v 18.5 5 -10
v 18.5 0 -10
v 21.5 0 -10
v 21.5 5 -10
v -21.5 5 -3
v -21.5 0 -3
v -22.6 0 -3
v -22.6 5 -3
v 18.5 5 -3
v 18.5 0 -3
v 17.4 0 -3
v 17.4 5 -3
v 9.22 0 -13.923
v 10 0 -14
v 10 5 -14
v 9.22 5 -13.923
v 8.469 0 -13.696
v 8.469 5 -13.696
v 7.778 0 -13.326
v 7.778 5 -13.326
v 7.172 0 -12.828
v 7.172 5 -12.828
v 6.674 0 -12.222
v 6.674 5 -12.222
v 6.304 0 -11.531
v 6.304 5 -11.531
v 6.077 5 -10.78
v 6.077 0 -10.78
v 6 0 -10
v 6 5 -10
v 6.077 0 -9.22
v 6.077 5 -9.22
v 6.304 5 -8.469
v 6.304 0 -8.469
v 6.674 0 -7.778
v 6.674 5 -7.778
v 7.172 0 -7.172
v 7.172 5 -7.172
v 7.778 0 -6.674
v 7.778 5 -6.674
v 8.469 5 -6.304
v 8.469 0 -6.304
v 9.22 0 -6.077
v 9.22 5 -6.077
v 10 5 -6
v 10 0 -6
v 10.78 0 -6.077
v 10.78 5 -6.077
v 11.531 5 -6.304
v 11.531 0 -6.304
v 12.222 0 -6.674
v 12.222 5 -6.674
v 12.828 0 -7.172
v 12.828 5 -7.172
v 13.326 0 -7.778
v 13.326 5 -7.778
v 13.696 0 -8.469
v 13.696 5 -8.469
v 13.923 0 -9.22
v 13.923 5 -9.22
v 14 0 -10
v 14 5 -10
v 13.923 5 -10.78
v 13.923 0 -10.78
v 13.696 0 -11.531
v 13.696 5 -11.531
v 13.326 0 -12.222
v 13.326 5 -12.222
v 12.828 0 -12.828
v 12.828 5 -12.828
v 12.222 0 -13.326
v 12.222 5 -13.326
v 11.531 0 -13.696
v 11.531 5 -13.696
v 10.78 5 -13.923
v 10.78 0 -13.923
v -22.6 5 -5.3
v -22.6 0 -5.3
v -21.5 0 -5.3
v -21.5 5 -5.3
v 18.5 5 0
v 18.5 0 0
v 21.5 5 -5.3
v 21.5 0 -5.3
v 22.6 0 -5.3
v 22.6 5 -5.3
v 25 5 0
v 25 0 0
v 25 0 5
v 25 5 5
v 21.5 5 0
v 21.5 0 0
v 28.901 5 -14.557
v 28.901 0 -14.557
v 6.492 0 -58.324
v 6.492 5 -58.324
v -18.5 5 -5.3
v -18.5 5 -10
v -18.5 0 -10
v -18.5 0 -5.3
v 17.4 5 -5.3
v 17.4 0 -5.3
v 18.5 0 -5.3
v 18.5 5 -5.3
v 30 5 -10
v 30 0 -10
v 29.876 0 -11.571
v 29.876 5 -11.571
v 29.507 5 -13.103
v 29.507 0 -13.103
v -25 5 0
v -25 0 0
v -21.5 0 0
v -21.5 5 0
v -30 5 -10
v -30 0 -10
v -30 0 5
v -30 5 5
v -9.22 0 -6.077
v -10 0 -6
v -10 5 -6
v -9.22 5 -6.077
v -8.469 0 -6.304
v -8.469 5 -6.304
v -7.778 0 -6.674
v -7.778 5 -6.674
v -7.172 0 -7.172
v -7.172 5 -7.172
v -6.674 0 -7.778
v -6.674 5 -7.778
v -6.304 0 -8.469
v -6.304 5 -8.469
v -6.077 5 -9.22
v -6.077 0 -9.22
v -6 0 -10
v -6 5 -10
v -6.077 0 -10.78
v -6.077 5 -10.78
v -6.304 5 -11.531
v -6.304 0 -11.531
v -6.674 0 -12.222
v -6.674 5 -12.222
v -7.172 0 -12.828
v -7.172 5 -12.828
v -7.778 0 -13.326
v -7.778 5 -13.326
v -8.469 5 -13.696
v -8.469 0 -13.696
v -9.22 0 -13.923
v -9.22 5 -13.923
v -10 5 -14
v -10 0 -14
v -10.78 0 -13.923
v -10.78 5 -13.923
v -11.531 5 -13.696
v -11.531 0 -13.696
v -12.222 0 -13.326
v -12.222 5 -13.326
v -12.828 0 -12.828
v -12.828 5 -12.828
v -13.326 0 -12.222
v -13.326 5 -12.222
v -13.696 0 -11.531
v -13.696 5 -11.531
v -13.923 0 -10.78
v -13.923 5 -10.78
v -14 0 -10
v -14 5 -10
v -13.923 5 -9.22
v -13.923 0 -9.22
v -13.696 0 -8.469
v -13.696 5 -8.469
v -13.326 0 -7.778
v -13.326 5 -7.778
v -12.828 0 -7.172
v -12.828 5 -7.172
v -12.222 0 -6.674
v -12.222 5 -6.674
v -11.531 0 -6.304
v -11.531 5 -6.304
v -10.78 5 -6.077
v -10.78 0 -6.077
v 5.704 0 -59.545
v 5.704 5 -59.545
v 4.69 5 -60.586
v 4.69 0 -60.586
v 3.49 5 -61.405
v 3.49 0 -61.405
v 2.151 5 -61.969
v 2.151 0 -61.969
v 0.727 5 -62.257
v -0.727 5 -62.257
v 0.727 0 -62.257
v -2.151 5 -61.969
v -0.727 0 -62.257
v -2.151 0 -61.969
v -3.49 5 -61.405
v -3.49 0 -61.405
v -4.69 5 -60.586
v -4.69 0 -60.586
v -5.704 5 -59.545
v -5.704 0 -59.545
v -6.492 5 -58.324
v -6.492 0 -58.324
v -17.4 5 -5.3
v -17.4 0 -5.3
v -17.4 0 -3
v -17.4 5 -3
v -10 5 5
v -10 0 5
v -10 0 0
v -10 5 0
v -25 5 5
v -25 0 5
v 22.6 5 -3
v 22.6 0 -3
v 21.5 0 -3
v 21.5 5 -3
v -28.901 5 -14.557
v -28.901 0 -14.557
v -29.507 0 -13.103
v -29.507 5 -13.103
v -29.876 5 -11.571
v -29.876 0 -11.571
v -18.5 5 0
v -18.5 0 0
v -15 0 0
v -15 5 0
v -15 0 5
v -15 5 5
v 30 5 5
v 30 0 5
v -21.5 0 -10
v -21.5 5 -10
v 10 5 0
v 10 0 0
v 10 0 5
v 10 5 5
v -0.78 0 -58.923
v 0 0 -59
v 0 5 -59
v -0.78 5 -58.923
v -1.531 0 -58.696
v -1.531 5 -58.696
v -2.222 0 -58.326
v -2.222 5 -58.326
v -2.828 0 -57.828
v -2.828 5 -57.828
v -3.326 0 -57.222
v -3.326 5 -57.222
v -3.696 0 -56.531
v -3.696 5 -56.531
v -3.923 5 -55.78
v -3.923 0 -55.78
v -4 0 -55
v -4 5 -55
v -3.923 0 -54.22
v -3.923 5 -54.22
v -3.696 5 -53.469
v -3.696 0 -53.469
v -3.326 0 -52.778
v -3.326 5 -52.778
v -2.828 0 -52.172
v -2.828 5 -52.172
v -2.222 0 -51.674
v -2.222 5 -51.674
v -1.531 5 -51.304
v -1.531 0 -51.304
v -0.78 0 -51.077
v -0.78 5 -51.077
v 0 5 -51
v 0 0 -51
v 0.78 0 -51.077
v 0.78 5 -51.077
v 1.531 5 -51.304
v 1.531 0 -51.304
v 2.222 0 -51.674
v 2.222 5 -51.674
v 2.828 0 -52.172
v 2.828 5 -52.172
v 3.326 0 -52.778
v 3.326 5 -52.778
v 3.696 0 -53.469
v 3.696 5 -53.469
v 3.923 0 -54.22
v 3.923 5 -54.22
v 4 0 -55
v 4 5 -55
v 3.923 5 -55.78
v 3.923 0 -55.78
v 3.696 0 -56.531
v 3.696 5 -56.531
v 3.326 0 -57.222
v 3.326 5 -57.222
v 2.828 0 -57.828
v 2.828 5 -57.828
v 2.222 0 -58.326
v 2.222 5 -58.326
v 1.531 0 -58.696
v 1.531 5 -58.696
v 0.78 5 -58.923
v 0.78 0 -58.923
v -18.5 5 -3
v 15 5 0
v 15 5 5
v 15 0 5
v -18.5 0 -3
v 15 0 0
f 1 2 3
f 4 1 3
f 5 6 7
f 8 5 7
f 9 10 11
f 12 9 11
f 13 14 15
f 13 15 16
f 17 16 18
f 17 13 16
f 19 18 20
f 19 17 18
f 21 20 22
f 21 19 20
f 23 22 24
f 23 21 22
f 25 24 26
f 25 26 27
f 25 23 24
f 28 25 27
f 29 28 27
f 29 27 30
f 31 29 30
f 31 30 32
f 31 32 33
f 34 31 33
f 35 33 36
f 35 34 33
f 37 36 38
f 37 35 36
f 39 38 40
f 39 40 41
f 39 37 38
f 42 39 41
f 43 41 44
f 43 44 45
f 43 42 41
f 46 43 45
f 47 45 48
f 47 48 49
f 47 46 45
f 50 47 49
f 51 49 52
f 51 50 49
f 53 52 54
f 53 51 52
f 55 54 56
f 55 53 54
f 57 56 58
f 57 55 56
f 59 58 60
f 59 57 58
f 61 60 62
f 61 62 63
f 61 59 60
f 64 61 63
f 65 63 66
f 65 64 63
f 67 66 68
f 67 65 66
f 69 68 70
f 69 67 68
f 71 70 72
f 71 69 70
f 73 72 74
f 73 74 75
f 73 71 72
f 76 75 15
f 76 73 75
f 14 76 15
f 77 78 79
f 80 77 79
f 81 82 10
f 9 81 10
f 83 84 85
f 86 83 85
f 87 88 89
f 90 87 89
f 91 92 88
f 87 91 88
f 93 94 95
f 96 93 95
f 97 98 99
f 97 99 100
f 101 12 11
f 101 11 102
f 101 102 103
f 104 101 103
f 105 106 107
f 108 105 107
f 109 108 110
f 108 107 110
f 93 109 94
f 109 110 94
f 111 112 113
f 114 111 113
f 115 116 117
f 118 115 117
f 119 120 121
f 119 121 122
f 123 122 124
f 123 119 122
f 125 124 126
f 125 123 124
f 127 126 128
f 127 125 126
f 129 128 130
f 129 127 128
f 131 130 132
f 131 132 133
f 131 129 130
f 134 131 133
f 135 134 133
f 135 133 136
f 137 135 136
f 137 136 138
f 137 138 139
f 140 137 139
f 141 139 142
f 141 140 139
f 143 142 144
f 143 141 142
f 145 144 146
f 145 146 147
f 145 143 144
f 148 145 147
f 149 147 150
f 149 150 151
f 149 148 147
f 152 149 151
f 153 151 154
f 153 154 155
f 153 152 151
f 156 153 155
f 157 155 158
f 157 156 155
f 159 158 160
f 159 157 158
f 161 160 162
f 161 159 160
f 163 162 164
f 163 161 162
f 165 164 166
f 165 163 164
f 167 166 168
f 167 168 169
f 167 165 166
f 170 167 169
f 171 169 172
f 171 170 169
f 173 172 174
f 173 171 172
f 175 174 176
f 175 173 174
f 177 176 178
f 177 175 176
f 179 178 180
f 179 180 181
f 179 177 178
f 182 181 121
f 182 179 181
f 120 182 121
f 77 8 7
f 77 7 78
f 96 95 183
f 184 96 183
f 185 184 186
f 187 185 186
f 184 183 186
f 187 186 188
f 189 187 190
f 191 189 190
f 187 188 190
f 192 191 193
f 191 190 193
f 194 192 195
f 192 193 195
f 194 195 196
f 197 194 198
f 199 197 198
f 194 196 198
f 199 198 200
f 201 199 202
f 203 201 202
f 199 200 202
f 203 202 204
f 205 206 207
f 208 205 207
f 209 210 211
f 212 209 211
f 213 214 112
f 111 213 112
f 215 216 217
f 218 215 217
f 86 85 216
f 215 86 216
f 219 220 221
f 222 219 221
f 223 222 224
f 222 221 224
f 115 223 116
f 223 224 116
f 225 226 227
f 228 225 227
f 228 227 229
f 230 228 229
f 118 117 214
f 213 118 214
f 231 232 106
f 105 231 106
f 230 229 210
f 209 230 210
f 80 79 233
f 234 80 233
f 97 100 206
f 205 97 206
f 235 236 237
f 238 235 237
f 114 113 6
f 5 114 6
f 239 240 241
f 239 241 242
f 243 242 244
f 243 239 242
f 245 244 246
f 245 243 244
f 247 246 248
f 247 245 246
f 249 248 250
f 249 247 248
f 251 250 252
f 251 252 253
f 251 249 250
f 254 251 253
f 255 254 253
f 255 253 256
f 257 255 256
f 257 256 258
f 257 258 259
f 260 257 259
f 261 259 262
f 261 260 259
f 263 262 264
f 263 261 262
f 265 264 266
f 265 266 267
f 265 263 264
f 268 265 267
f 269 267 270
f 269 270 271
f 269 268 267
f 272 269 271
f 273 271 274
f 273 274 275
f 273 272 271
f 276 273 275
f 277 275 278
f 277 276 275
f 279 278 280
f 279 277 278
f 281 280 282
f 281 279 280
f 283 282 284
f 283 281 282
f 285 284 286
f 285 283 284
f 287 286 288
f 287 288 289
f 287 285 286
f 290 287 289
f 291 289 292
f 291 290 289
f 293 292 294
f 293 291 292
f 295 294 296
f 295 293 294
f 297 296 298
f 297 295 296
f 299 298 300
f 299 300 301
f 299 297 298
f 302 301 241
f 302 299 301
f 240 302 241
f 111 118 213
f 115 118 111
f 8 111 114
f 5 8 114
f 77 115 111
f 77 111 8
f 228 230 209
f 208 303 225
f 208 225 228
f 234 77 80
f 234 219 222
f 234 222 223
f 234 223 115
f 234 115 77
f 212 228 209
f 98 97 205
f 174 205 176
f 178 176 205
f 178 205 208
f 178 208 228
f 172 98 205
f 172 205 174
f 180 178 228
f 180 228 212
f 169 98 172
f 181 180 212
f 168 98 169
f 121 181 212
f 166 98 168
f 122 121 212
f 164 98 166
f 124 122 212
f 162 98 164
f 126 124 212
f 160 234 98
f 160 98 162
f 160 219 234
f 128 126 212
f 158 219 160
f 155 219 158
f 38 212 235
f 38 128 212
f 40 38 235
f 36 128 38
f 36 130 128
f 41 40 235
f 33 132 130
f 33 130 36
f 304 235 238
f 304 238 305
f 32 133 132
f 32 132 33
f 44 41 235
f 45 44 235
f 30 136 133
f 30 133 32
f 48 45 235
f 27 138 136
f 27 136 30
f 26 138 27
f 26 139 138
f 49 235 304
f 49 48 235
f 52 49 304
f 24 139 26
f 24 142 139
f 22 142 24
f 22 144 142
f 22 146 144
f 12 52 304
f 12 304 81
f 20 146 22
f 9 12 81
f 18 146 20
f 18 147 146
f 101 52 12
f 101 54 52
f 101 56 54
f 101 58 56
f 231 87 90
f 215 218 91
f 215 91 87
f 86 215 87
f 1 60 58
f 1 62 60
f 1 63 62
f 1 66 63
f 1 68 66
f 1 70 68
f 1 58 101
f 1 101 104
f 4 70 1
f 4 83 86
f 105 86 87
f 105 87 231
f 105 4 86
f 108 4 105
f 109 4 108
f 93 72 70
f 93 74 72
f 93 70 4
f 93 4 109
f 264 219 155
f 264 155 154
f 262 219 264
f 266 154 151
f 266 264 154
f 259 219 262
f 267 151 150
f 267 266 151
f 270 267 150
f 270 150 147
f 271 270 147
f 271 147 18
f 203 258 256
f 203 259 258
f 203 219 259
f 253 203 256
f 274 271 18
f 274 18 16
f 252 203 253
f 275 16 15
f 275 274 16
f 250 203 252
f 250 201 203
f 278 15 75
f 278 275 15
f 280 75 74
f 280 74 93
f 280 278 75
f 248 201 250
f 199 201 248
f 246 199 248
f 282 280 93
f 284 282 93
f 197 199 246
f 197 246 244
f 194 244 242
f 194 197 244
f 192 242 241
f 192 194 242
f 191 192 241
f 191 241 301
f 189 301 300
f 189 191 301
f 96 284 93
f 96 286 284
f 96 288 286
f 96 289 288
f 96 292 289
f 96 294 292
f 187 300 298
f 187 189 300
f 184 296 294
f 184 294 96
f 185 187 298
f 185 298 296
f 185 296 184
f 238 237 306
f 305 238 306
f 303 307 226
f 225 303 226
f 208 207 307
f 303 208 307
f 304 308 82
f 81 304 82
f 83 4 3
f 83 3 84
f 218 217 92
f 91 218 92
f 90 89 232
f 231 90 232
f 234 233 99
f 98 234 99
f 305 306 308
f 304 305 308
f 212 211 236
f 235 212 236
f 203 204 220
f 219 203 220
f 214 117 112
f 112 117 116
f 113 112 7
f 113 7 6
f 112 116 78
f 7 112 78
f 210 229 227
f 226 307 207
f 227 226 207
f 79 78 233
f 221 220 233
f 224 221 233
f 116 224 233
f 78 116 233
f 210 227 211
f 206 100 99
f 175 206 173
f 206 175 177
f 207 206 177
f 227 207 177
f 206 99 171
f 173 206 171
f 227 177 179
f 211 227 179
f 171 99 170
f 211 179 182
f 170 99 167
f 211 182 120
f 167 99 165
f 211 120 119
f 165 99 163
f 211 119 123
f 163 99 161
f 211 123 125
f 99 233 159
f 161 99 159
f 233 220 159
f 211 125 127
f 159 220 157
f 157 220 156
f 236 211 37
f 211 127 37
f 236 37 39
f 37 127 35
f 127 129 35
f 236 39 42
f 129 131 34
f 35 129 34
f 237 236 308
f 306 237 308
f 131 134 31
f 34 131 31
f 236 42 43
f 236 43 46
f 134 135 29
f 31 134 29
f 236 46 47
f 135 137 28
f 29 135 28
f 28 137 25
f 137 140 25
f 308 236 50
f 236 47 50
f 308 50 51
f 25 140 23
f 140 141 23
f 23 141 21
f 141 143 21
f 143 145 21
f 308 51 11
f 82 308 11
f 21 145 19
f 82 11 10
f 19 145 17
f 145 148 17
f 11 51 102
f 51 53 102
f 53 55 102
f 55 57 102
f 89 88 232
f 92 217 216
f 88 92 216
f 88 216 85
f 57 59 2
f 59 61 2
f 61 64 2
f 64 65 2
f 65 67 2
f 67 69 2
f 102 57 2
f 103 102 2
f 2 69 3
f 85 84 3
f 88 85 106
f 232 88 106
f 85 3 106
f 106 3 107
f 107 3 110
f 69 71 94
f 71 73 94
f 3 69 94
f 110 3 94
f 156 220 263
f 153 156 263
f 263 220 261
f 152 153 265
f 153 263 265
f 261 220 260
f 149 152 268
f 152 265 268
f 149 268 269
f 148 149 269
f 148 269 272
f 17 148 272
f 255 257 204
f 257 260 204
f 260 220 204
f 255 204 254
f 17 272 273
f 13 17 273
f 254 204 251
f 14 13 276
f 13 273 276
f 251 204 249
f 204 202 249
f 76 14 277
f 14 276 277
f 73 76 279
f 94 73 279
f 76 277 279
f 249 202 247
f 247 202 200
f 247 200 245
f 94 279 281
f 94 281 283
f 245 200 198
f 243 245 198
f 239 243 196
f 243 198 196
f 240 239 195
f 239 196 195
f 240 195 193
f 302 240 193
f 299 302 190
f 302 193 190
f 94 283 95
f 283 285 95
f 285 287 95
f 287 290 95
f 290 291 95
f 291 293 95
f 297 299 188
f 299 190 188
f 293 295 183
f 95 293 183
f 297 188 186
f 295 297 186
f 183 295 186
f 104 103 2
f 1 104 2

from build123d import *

# Parameters (mm, degrees)
SKETCH1_R           = 4
BOSS_EXTRUDE1_DEPTH = 5


with BuildPart() as part:
    # Sketch1 → Boss-Extrude1 (new body)
    with BuildSketch(Plane(origin=(0, 0, 0), x_dir=(1, 0, 0), z_dir=(0, 1, 0))):
        with BuildLine():
            Line((-30, 10), (-30, -5))
            Line((-30, -5), (-25, -5))
            Line((-25, -5), (-25, 0))
            Line((-25, 0), (-21.5, 0))
            Line((-21.5, 0), (-21.5, 3))
            Line((-21.5, 3), (-22.6, 3))
            Line((-22.6, 3), (-22.6, 5.3))
            Line((-22.6, 5.3), (-21.5, 5.3))
            Line((-21.5, 5.3), (-21.5, 10))
            Line((-21.5, 10), (-18.5, 10))
            Line((-18.5, 10), (-18.5, 5.3))
            Line((-18.5, 5.3), (-17.4, 5.3))
            Line((-17.4, 5.3), (-17.4, 3))
            Line((-17.4, 3), (-18.5, 3))
            Line((-18.5, 3), (-18.5, 0))
            Line((-18.5, 0), (-15, 0))
            Line((-15, 0), (-15, -5))
            Line((-15, -5), (-10, -5))
            Line((-10, -5), (-10, 0))
            Line((-10, 0), (10, 0))
            Line((10, 0), (10, -5))
            Line((10, -5), (15, -5))
            Line((15, -5), (15, 0))
            Line((15, 0), (18.5, 0))
            Line((18.5, 0), (18.5, 3))
            Line((18.5, 3), (17.4, 3))
            Line((17.4, 3), (17.4, 5.3))
            Line((17.4, 5.3), (18.5, 5.3))
            Line((18.5, 5.3), (18.5, 10))
            Line((18.5, 10), (21.5, 10))
            Line((21.5, 10), (21.5, 5.3))
            Line((21.5, 5.3), (22.6, 5.3))
            Line((22.6, 5.3), (22.6, 3))
            Line((22.6, 3), (21.5, 3))
            Line((21.5, 3), (21.5, 0))
            Line((21.5, 0), (25, 0))
            Line((25, 0), (25, -5))
            Line((25, -5), (30, -5))
            Line((30, -5), (30, 10))
            ThreePointArc((30, 10), (29.721396184, 12.344025646), (28.901108754, 14.557440395))
            Line((28.901108754, 14.557440395), (6.492233497, 58.324076585))
            ThreePointArc((6.492233497, 58.324076585), (0, 62.293735732), (-6.492233497, 58.324076585))
            Line((-6.492233497, 58.324076585), (-28.901108754, 14.557440395))
            ThreePointArc((-28.901108754, 14.557440395), (-29.721396184, 12.344025646), (-30, 10))
        make_face()
        with Locations(Location((0, 55, 0), (0, 0, 90))):
            Circle(SKETCH1_R, mode=Mode.SUBTRACT)
        with Locations(Location((-10, 10, 0), (0, 0, 270))):
            Circle(SKETCH1_R, mode=Mode.SUBTRACT)
        with Locations(Location((10, 10, 0), (0, 0, 90))):
            Circle(SKETCH1_R, mode=Mode.SUBTRACT)
    extrude(amount=BOSS_EXTRUDE1_DEPTH)


solid = part.part
